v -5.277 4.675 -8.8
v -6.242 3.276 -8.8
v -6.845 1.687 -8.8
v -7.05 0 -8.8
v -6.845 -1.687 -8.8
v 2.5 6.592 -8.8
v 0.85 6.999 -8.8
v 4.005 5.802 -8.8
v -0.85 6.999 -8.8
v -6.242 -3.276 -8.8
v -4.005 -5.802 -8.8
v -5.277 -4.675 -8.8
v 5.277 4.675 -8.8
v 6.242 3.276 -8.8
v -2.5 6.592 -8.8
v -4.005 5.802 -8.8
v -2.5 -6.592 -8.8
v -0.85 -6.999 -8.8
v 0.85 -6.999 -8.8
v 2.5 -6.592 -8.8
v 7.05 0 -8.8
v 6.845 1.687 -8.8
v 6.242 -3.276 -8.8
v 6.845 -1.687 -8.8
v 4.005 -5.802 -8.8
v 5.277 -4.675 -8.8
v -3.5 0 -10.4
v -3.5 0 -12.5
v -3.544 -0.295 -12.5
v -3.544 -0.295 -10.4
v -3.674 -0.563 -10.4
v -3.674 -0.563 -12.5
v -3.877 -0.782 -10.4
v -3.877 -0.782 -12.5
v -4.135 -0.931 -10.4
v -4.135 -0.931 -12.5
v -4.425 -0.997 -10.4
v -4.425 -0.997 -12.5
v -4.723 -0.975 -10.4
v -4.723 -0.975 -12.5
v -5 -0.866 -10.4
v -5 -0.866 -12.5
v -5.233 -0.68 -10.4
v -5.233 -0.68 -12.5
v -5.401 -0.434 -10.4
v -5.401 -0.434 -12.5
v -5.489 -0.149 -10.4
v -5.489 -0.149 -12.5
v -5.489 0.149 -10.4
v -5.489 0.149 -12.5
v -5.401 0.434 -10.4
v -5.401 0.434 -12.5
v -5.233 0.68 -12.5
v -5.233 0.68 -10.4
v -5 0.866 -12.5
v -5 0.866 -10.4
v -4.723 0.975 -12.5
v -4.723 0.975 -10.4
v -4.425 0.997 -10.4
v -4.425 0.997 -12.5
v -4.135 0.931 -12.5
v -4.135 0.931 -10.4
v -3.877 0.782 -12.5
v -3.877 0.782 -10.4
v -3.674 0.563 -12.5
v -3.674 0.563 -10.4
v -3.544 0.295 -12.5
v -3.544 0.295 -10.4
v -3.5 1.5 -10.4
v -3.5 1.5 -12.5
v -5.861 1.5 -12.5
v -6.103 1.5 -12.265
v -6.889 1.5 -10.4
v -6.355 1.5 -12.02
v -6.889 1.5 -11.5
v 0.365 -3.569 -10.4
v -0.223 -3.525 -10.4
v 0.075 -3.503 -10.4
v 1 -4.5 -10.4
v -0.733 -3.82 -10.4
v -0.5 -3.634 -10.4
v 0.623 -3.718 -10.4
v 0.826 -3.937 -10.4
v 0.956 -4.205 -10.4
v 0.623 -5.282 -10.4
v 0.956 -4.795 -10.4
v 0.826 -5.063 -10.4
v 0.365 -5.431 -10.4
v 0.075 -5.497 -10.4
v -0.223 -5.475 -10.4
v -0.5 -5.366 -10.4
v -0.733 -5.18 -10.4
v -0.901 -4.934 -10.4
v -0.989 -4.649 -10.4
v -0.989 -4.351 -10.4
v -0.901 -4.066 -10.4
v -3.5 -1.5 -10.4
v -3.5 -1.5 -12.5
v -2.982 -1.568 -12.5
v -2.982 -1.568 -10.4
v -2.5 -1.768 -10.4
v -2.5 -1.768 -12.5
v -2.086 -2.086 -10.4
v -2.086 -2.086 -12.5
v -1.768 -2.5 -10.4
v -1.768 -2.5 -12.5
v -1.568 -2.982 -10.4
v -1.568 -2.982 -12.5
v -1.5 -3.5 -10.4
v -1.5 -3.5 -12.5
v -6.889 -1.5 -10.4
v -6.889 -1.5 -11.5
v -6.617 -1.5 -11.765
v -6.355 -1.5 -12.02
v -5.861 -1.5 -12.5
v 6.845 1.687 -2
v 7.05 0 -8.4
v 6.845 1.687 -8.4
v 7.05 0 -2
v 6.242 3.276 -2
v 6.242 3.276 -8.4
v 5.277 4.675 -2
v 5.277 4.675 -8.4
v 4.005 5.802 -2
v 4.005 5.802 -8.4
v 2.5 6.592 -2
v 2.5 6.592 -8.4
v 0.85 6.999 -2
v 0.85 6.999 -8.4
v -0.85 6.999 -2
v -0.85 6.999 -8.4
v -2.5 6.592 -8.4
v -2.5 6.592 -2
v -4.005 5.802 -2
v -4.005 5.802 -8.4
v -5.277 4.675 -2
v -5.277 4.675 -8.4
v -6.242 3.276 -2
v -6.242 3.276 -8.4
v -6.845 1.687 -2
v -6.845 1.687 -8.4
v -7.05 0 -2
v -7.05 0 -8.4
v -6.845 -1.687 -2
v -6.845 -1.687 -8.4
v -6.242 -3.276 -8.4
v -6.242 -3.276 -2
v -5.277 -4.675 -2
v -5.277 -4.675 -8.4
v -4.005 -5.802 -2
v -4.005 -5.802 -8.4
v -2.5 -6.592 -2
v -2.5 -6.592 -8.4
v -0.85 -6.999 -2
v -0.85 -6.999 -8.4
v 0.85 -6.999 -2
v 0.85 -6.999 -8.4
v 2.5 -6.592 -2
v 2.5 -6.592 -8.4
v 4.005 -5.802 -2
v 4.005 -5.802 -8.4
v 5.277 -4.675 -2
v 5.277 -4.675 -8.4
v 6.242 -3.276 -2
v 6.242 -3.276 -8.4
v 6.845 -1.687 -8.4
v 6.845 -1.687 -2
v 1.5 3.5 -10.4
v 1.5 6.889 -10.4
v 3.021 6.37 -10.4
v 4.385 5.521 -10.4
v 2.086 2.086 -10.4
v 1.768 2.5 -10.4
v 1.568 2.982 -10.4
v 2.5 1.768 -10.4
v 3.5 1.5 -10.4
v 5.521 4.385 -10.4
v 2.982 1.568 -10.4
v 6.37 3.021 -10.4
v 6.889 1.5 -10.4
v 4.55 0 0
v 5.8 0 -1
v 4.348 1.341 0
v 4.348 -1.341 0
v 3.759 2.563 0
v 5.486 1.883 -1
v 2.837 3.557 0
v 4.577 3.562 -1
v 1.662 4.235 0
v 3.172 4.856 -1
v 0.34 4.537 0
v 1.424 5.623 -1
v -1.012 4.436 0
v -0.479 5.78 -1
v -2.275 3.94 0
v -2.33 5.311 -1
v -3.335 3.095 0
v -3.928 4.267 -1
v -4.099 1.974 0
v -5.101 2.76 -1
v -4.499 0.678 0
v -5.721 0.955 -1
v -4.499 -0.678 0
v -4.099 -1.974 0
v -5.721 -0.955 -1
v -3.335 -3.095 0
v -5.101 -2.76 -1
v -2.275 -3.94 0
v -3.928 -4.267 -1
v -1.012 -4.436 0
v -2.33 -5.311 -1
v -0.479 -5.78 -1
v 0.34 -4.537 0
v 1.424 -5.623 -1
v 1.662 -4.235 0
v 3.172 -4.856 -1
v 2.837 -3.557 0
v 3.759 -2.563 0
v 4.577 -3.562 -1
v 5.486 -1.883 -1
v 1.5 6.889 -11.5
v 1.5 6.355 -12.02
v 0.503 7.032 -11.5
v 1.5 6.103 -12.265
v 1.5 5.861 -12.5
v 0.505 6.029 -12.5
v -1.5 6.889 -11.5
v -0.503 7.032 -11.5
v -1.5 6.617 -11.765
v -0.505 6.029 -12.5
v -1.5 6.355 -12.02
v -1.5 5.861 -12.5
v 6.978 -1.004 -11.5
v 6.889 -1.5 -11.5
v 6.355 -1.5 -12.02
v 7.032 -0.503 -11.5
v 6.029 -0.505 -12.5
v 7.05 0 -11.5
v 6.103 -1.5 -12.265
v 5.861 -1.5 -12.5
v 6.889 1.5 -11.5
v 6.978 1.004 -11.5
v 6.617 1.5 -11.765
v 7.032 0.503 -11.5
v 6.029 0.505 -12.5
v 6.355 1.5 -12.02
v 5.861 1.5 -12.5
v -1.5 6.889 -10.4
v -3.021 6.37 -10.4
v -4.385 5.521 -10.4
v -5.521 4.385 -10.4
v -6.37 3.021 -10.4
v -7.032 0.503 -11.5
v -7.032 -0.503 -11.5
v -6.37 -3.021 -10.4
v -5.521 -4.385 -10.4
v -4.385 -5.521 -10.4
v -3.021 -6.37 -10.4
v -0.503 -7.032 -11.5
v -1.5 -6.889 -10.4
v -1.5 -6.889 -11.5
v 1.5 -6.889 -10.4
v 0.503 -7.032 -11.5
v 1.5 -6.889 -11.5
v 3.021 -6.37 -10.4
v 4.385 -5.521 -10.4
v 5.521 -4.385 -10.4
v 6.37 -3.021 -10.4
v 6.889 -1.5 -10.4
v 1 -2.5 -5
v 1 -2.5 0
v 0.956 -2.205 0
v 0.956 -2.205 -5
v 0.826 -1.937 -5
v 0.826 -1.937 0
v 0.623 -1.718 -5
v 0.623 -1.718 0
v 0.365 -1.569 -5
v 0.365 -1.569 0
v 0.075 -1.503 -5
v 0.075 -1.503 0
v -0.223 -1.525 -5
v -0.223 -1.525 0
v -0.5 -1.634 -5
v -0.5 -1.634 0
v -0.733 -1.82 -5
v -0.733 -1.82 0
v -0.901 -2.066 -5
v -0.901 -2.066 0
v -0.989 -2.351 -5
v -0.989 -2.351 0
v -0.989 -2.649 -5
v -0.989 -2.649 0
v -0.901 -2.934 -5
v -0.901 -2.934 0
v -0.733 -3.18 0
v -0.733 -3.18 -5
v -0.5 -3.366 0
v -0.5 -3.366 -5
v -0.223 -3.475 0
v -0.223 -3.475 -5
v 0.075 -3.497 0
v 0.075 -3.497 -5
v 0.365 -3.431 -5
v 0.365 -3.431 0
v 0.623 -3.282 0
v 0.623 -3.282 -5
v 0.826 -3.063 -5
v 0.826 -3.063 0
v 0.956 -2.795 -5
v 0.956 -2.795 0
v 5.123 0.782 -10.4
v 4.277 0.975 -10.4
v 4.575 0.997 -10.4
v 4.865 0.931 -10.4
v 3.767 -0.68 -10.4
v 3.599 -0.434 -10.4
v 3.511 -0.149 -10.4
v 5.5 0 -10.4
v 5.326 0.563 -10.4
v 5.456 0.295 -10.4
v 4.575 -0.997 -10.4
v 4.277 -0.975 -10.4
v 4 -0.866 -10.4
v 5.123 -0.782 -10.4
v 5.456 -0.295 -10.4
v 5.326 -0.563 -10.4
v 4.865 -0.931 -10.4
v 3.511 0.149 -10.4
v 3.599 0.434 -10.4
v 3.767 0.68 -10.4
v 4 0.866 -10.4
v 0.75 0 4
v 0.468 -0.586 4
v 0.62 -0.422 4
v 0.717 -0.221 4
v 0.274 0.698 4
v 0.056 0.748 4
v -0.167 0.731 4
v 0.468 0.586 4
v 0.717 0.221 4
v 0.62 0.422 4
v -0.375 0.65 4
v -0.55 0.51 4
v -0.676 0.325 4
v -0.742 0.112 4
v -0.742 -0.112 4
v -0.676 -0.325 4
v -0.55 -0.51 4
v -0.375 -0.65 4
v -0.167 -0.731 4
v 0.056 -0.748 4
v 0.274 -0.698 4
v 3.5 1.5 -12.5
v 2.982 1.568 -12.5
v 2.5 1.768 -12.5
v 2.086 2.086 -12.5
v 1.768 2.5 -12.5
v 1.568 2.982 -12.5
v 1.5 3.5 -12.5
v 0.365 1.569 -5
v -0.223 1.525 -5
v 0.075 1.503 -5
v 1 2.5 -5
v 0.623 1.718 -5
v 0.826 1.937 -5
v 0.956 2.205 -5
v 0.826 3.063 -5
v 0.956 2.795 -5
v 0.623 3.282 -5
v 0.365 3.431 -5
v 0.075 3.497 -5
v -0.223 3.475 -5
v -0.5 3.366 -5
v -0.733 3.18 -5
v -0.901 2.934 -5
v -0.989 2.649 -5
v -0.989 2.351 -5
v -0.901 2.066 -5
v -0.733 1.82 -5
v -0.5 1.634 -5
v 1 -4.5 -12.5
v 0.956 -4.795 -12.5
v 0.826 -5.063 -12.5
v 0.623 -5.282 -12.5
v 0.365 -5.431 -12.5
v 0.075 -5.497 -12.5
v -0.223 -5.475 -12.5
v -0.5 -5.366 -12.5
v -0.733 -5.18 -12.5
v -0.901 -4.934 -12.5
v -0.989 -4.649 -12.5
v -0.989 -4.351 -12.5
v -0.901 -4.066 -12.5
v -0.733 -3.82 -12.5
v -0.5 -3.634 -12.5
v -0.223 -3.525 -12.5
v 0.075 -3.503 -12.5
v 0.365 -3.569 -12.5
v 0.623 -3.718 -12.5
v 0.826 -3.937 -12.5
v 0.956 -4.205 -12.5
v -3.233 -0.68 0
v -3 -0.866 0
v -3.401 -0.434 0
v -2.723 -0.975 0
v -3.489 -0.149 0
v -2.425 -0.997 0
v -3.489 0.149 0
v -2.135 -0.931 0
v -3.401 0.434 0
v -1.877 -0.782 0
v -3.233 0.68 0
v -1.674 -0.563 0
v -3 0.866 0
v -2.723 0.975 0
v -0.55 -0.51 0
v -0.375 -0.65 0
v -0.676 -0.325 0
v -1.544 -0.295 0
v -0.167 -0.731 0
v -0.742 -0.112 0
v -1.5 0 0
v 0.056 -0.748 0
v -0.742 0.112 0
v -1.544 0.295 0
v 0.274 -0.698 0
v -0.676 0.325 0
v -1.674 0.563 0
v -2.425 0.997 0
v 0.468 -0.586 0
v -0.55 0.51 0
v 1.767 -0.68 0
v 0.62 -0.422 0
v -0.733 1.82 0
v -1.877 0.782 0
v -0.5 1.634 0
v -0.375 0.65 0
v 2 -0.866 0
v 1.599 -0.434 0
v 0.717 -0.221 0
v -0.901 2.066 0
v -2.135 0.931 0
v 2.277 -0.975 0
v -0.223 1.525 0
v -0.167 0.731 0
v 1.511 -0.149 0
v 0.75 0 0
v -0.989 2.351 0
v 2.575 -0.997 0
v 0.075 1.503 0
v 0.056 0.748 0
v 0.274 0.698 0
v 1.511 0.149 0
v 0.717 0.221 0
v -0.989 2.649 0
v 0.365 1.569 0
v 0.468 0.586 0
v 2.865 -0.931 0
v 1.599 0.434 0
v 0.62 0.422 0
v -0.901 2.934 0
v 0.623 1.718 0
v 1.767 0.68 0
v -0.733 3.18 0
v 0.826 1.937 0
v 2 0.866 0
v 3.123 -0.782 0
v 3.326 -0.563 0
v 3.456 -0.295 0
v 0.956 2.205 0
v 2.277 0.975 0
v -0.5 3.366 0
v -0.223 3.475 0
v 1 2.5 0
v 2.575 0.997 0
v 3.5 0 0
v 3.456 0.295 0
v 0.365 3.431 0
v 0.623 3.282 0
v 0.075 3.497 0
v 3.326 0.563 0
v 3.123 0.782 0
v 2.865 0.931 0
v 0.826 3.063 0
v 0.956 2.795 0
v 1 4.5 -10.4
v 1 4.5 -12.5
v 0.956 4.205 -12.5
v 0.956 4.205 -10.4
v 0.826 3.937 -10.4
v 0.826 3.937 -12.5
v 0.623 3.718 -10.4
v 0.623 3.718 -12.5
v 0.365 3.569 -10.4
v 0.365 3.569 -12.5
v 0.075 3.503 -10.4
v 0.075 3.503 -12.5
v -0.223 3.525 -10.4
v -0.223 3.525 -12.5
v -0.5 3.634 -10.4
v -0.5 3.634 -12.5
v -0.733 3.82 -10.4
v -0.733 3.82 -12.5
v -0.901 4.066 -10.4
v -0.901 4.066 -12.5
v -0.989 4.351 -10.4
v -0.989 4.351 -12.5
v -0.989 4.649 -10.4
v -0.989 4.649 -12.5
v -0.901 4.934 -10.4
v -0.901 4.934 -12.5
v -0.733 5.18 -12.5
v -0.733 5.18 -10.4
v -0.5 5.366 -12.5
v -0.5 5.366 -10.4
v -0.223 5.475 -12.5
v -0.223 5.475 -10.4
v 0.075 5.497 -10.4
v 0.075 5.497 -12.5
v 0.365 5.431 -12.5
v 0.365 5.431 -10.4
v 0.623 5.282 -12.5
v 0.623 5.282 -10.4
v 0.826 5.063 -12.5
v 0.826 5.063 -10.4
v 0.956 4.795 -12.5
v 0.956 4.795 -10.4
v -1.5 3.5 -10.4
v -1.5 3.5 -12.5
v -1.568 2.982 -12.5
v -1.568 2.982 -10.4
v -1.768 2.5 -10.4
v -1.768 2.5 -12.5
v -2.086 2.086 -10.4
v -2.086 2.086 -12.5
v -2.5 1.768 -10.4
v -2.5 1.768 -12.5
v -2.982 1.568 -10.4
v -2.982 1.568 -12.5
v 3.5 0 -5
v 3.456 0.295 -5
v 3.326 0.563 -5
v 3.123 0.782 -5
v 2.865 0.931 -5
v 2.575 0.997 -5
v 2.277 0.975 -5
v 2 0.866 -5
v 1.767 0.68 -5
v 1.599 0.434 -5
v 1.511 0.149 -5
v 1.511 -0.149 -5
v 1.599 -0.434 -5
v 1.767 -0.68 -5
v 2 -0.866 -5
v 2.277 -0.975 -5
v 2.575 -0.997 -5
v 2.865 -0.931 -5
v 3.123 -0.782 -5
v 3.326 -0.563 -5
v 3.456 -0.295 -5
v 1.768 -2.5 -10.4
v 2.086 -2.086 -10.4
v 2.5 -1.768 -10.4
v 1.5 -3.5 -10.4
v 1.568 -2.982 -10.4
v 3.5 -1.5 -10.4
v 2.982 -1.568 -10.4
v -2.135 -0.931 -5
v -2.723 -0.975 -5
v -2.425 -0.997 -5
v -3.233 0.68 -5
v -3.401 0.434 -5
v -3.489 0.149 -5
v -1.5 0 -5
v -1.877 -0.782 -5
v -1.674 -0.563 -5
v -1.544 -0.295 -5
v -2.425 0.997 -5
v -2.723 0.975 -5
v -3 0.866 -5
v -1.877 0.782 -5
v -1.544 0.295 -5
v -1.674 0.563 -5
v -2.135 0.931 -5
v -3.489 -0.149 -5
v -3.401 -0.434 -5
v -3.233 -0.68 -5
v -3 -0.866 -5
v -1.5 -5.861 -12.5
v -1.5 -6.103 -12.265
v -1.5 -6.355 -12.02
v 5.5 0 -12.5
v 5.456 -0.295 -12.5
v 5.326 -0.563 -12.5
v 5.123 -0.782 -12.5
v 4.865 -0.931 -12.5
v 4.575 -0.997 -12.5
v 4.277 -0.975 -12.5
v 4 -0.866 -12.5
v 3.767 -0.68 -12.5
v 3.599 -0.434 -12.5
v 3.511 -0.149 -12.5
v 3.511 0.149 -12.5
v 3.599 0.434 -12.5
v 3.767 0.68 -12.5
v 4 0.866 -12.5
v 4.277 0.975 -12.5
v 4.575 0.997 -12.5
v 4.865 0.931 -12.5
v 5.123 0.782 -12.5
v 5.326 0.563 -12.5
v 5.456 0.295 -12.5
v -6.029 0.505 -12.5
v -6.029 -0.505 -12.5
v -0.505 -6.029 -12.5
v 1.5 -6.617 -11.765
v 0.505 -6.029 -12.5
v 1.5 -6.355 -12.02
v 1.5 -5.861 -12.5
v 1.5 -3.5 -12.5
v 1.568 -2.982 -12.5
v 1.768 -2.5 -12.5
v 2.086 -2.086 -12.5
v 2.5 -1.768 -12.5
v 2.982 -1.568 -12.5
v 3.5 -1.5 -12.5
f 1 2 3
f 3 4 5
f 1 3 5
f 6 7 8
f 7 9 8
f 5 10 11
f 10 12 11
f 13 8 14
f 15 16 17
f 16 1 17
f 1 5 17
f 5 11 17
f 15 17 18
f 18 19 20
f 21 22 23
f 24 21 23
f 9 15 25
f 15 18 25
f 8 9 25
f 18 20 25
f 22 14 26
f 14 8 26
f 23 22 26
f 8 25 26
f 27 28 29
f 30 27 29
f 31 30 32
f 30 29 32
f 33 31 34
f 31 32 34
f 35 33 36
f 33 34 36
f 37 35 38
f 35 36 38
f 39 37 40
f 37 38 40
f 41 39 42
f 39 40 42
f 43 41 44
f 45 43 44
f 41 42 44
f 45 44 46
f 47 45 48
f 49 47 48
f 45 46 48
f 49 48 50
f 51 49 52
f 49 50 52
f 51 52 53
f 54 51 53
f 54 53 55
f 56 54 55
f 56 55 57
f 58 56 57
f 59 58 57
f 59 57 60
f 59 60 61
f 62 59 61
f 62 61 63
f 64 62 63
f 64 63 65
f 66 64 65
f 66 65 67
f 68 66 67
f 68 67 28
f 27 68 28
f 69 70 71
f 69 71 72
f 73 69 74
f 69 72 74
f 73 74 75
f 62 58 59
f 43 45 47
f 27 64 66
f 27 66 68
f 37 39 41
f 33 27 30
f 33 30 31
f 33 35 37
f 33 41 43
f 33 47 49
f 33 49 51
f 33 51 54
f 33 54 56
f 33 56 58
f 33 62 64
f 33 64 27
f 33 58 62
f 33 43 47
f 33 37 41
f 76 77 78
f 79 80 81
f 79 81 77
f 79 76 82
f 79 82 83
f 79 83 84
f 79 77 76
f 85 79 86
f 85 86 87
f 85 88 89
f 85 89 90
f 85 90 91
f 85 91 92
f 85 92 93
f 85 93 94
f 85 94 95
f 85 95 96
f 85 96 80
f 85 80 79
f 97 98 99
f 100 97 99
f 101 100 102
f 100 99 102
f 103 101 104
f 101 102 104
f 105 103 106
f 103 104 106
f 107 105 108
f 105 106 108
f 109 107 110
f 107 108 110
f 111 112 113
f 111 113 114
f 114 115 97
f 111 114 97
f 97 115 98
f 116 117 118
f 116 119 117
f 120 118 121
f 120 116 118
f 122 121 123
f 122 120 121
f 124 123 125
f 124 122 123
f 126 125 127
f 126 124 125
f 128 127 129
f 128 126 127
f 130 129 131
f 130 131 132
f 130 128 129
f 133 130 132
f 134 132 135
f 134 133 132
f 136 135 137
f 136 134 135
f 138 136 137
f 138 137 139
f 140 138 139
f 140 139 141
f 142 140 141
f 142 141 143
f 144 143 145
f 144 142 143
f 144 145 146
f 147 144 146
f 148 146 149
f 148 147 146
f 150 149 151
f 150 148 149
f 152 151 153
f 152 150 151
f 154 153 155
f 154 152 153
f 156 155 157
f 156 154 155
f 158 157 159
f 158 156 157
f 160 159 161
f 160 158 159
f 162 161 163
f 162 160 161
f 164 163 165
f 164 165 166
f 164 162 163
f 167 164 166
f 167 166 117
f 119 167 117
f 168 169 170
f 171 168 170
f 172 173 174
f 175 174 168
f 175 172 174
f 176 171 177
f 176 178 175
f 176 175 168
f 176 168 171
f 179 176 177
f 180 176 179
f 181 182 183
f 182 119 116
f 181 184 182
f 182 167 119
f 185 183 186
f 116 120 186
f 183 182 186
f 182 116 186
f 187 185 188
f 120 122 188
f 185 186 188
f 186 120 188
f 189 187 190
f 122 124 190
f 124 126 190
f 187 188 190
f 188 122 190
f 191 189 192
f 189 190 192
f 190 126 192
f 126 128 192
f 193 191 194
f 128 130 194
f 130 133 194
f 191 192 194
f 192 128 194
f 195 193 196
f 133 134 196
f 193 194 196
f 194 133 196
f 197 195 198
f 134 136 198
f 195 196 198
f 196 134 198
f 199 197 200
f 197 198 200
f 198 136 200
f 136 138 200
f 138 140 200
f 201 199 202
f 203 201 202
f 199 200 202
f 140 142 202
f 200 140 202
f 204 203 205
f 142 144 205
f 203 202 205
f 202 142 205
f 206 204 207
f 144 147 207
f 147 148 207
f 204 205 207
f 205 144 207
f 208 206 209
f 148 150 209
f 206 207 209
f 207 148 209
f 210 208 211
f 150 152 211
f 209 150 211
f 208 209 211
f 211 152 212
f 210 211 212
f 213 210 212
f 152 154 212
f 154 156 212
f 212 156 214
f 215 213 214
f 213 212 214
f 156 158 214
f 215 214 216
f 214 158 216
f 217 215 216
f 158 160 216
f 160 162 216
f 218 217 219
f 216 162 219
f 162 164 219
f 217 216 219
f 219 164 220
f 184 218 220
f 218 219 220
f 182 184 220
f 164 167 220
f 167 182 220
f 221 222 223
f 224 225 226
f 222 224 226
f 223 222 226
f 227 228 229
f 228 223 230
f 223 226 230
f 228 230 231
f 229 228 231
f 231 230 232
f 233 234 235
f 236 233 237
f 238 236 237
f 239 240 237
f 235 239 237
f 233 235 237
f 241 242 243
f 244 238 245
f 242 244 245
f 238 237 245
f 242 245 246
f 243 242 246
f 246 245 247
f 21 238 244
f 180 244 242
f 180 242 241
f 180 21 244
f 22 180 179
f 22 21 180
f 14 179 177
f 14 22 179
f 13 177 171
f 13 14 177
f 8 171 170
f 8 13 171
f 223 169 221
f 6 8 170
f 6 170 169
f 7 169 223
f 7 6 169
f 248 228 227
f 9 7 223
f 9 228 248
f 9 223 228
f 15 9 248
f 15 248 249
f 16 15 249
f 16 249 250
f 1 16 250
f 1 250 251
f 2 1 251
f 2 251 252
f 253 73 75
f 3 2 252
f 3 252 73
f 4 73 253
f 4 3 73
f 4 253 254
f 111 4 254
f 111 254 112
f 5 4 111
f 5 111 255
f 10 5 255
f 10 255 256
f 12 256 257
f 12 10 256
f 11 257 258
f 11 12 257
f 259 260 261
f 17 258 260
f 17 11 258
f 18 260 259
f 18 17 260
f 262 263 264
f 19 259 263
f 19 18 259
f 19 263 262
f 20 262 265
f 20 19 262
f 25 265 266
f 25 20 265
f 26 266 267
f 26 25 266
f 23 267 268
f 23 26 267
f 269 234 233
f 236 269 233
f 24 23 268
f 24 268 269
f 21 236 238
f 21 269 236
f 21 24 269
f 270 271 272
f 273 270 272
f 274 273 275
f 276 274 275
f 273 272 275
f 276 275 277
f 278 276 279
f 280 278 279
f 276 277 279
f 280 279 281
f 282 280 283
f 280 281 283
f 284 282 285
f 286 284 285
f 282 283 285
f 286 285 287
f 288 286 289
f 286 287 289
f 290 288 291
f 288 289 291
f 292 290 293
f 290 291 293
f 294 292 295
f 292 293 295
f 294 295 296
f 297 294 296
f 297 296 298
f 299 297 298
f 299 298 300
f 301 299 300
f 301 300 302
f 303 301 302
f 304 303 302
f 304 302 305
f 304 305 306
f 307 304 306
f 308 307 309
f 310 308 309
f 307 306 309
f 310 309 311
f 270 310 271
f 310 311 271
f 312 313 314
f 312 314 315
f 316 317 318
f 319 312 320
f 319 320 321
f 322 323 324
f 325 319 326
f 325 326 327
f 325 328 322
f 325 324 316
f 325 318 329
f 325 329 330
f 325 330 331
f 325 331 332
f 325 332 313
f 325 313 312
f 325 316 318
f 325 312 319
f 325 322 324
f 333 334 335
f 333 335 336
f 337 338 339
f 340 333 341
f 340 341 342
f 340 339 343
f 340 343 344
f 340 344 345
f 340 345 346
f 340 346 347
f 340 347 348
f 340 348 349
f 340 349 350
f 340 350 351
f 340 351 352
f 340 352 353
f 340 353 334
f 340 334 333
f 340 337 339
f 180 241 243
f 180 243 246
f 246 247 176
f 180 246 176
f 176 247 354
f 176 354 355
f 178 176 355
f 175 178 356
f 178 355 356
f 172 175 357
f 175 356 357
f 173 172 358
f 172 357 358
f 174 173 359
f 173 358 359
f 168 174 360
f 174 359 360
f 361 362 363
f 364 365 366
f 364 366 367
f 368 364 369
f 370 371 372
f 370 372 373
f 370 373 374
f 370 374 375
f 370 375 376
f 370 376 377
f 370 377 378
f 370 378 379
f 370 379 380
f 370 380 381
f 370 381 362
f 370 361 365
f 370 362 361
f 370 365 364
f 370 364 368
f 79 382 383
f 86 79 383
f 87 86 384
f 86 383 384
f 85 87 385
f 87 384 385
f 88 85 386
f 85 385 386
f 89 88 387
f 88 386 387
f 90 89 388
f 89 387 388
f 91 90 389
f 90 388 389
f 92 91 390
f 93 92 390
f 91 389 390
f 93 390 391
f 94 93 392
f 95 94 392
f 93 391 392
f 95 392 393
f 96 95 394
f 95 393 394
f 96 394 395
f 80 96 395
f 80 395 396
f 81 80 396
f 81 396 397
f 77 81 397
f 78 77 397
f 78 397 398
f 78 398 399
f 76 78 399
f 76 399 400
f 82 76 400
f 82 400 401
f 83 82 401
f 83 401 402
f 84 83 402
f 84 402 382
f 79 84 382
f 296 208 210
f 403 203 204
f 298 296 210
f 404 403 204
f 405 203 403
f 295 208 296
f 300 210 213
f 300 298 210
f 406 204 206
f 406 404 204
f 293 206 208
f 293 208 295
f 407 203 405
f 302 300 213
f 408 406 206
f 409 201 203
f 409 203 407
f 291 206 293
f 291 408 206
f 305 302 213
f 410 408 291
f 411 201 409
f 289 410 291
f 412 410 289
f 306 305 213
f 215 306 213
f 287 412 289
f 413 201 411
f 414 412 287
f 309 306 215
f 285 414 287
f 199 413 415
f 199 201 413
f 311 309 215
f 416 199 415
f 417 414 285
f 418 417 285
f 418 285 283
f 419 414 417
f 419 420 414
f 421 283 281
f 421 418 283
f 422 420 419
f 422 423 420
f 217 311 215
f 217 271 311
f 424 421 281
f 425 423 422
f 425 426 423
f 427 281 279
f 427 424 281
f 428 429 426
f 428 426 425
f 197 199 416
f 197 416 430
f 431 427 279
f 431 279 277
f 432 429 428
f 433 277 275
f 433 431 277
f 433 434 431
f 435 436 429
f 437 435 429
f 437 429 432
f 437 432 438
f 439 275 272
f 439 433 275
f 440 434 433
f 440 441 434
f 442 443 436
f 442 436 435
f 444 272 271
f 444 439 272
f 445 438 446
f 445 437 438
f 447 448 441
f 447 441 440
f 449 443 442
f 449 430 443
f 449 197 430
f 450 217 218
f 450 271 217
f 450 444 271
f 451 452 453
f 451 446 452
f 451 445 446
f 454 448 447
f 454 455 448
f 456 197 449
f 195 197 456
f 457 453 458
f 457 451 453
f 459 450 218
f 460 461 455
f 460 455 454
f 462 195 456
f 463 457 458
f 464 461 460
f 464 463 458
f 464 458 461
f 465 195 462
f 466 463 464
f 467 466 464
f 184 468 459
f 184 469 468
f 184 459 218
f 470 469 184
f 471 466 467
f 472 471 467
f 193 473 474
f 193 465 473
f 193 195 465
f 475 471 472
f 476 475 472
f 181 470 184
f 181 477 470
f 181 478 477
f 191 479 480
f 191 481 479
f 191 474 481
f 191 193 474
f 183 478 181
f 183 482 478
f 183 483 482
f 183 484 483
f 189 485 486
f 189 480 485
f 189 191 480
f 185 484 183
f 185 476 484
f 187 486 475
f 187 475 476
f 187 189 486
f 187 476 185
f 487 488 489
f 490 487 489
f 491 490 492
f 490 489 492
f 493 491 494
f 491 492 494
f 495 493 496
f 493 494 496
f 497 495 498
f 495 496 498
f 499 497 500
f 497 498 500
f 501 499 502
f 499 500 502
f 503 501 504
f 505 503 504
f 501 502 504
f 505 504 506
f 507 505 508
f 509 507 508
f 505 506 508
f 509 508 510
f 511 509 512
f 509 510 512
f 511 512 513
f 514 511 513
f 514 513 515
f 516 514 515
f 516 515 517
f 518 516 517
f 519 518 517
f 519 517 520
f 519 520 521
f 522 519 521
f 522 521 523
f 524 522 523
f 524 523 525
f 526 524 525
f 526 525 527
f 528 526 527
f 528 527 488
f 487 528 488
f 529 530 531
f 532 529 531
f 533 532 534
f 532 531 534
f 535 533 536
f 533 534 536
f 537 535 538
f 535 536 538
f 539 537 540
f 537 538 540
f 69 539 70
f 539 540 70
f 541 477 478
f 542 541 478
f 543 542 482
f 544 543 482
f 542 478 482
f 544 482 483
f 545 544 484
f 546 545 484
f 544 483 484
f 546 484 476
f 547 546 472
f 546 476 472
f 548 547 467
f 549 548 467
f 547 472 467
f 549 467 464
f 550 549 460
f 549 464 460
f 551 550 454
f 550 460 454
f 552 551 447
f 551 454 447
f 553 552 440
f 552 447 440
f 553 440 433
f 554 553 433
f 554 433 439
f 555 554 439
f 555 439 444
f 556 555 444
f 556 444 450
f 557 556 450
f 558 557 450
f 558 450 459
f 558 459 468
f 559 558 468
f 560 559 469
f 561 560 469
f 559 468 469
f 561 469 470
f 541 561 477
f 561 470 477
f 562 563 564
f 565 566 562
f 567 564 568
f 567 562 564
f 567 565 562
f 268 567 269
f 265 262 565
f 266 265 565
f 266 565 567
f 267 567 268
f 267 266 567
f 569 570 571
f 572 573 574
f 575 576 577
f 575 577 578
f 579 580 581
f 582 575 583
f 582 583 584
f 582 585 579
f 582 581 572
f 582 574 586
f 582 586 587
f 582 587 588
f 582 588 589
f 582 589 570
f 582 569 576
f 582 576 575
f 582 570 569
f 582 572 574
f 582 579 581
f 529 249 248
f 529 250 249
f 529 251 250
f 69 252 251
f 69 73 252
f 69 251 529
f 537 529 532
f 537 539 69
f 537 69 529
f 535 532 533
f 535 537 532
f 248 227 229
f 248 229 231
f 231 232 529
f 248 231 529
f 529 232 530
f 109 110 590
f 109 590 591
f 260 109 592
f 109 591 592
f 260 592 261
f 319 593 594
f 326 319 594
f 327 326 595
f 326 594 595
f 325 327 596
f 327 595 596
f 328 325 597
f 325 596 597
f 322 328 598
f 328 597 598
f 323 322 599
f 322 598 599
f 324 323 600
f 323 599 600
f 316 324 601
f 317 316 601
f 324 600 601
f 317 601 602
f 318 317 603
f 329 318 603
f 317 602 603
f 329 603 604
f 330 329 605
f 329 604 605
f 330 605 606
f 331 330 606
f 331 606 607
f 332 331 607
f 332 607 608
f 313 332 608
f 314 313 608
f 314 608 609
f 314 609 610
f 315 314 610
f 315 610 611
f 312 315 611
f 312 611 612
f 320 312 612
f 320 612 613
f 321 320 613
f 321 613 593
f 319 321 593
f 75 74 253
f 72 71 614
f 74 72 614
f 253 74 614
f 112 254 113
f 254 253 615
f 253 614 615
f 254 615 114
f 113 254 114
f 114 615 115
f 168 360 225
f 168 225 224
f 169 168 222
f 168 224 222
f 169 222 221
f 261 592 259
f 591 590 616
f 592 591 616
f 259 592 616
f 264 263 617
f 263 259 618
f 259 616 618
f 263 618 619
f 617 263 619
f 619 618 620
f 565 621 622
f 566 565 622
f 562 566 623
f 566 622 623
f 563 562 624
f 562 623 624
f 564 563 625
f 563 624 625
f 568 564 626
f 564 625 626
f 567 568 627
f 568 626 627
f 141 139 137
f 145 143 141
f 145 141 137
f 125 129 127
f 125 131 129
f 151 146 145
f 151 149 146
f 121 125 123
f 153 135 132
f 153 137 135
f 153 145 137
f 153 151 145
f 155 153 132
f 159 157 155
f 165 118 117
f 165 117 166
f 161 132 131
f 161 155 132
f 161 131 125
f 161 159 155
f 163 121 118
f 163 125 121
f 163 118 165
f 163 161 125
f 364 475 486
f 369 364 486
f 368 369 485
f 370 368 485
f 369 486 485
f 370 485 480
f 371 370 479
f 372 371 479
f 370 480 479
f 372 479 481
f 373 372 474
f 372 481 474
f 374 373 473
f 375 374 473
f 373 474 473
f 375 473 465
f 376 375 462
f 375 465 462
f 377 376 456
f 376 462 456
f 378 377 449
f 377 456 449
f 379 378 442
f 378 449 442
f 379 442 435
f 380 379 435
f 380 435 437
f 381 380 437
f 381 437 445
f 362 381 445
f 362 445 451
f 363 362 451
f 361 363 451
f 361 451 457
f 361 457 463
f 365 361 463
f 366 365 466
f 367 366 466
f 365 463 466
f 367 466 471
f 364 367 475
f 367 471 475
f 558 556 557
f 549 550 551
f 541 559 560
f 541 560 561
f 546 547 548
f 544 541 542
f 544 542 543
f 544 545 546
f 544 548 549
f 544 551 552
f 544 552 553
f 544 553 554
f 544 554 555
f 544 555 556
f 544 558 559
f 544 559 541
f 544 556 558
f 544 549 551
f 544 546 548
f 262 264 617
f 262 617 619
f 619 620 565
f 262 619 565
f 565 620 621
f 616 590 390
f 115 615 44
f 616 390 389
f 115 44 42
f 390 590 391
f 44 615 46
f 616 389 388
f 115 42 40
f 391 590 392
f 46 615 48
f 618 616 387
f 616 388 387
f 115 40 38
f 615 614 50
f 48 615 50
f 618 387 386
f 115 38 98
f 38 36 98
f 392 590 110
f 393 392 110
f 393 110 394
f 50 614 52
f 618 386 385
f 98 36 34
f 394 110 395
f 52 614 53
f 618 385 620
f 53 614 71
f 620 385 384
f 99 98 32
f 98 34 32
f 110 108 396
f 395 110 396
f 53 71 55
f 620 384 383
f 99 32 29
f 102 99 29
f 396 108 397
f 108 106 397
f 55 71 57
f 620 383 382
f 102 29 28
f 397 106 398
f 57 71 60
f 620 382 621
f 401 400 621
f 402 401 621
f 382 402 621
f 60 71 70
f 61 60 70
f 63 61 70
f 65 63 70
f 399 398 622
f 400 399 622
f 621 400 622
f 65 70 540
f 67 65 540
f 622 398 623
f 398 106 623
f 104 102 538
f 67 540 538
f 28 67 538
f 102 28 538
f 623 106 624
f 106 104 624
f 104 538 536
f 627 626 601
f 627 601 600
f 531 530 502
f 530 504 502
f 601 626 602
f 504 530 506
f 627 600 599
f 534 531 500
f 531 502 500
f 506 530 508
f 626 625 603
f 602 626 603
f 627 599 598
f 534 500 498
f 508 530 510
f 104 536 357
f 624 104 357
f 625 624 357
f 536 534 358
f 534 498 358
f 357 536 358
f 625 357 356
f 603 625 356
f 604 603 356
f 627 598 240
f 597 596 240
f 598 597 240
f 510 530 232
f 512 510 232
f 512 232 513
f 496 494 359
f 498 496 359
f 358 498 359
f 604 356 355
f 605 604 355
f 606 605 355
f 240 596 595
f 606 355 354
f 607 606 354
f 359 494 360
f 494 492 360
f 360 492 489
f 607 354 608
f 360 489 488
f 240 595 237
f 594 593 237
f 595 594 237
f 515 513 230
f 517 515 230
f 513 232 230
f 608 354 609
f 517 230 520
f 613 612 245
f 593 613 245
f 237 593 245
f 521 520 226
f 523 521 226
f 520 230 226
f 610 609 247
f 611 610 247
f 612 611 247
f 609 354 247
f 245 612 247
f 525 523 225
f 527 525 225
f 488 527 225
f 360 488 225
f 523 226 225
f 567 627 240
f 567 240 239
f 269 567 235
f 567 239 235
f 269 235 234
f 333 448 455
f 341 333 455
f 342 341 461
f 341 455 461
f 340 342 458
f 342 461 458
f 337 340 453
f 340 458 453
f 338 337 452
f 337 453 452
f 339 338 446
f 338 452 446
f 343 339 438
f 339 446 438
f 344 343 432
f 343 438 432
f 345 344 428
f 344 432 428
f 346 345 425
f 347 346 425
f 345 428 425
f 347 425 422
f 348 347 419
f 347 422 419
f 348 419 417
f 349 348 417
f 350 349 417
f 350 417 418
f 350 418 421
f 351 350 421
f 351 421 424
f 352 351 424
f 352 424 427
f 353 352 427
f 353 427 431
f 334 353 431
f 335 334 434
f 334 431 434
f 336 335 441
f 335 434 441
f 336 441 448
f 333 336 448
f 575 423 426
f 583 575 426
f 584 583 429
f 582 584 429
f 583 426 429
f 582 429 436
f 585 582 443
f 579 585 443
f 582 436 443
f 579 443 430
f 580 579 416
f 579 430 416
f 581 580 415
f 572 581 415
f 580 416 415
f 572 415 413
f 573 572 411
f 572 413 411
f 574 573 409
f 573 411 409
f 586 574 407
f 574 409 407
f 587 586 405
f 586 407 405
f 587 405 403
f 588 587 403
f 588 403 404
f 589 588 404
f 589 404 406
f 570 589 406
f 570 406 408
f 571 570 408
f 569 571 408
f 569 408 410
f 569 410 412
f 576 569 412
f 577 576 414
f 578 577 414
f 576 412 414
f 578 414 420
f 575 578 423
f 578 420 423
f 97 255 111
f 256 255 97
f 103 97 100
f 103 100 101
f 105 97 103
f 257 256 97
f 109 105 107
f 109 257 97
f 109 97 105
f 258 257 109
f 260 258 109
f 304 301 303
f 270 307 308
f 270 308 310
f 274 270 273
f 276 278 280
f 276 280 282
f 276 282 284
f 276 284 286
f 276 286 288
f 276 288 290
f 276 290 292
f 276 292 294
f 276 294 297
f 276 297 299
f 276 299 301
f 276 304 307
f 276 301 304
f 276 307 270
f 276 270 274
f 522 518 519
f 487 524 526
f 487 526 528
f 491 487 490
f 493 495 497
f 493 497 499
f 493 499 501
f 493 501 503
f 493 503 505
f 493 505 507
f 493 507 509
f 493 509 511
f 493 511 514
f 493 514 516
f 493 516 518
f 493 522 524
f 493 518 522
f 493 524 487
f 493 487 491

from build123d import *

# Parameters (mm, degrees)
F0_R      = 7.05
F0_R_2    = 4.5
F0_R_3    = 1
F0_R_4    = 0.75
F1_DEPTH  = 12.5
F2_SIZE2  = 2
F2_SIZE   = 2.5
F3_DEPTH  = 4
F4_DEPTH  = 5
F5_SIZE   = 1
F7_R      = 1
F8_DEPTH  = 2.5
F10_R     = 8.05
F11_DEPTH = 0.4


# Not quite as in the source:
# - a feature names something its author has since deleted; it is built from what else it names


with BuildPart() as f1:
    # F0 (on Top) → F1 (new body)
    with BuildSketch(Plane.XY):
        Circle(F0_R)
        Circle(F0_R_2, mode=Mode.SUBTRACT)
        Circle(F0_R_2)
        with Locations((0, -2.5)):
            Circle(F0_R_3, mode=Mode.SUBTRACT)
        with Locations((-2.5, 0)):
            Circle(F0_R_3, mode=Mode.SUBTRACT)
        Circle(F0_R_4, mode=Mode.SUBTRACT)
        with Locations((2.5, 0)):
            Circle(F0_R_3, mode=Mode.SUBTRACT)
        with Locations((0, 2.5)):
            Circle(F0_R_3, mode=Mode.SUBTRACT)
        with Locations((0, 2.5)):
            Circle(F0_R_3)
        with Locations((2.5, 0)):
            Circle(F0_R_3)
        with Locations((-2.5, 0)):
            Circle(F0_R_3)
        with Locations((0, -2.5)):
            Circle(F0_R_3)
        Circle(F0_R_4)
    extrude(amount=-F1_DEPTH)

    # F2
    f2_edges = [f1.edges().sort_by_distance(p)[0] for p in [
        (-7.05, 0, 0),
    ]]
    f2_side = f1.faces().sort_by_distance((0, 0, 0))[0]
    chamfer(f2_edges, length=F2_SIZE, length2=F2_SIZE2, reference=f2_side)

    # F0 (on Top) → F3 (join)
    with BuildSketch(Plane.XY):
        Circle(F0_R_4)
    extrude(amount=F3_DEPTH)

    # F0 (on Top) → F4 (cut)
    with BuildSketch(Plane.XY):
        with Locations((-2.5, 0)):
            Circle(F0_R_3)
        with Locations((2.5, 0)):
            Circle(F0_R_3)
        with Locations((0, 2.5)):
            Circle(F0_R_3)
        with Locations((0, -2.5)):
            Circle(F0_R_3)
    extrude(amount=-F4_DEPTH, mode=Mode.SUBTRACT)

    # F5
    f5_edges = [f1.edges().sort_by_distance(p)[0] for p in [
        (-7.05, 0, -12.5),
    ]]
    chamfer(f5_edges, length=F5_SIZE)

    # F7 (on offset) → F8 (cut)
    with BuildSketch(Plane(origin=(0, 0, -12.9), x_dir=(1, 0, 0), z_dir=(0, 0, -1))):
        with Locations((4.5, 0)):
            Circle(F7_R)
        with Locations((0, 4.5)):
            Circle(F7_R)
        with Locations((-4.5, 0)):
            Circle(F7_R)
        with Locations((0, -4.5)):
            Circle(F7_R)
        with BuildLine():
            Line((12.5710678119, -1.5), (3.5, -1.5))
            ThreePointArc((3.5, -1.5), (2.0857864376, -2.0857864376), (1.5, -3.5))
            Line((1.5, -3.5), (1.5, -12.5710678119))
            Line((1.5, -12.5710678119), (12.5710678119, -1.5))
        make_face()
        with BuildLine():
            Line((12.5710678119, 1.5), (1.5, 12.5710678119))
            Line((1.5, 12.5710678119), (1.5, 3.5))
            ThreePointArc((1.5, 3.5), (2.0857864376, 2.0857864376), (3.5, 1.5))
            Line((3.5, 1.5), (12.5710678119, 1.5))
        make_face()
        with BuildLine():
            Line((-1.5, 12.5710678119), (-12.5710678119, 1.5))
            Line((-12.5710678119, 1.5), (-3.5, 1.5))
            ThreePointArc((-3.5, 1.5), (-2.0857864376, 2.0857864376), (-1.5, 3.5))
            Line((-1.5, 3.5), (-1.5, 12.5710678119))
        make_face()
        with BuildLine():
            Line((-12.5710678119, -1.5), (-1.5, -12.5710678119))
            Line((-1.5, -12.5710678119), (-1.5, -3.5))
            ThreePointArc((-1.5, -3.5), (-2.0857864376, -2.0857864376), (-3.5, -1.5))
            Line((-3.5, -1.5), (-12.5710678119, -1.5))
        make_face()
    extrude(amount=-F8_DEPTH, mode=Mode.SUBTRACT)

    # F10 (on offset) → F11 (cut)
    with BuildSketch(Plane(origin=(0, 0, -8.8), x_dir=(1, 0, 0), z_dir=(0, 0, -1))):
        Circle(F10_R)
    extrude(amount=-F11_DEPTH, mode=Mode.SUBTRACT)


solid = f1.part
